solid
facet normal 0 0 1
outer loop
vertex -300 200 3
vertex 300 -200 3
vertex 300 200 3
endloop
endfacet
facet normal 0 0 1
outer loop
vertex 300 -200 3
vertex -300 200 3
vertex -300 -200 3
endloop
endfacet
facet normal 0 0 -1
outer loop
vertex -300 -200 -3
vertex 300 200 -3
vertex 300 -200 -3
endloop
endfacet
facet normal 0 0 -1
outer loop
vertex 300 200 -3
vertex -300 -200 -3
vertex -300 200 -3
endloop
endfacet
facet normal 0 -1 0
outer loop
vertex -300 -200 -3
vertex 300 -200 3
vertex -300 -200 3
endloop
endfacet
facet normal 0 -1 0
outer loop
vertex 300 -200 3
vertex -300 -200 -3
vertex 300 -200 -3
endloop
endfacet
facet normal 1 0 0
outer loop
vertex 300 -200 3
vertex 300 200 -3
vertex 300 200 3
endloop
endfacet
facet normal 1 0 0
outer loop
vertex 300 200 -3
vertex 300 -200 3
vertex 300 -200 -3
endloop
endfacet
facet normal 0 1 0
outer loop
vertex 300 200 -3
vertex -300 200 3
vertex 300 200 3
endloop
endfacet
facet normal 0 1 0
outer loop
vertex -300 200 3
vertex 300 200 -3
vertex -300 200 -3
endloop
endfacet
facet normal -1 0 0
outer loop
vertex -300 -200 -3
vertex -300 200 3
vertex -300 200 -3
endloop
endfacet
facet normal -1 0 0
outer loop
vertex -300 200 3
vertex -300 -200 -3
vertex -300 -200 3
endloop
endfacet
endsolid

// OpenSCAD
$fn=64;

module sheet_mdf(length=600, width=400, thickness=6) {
    cube([length, width, thickness], center=true);
}

sheet_mdf();
